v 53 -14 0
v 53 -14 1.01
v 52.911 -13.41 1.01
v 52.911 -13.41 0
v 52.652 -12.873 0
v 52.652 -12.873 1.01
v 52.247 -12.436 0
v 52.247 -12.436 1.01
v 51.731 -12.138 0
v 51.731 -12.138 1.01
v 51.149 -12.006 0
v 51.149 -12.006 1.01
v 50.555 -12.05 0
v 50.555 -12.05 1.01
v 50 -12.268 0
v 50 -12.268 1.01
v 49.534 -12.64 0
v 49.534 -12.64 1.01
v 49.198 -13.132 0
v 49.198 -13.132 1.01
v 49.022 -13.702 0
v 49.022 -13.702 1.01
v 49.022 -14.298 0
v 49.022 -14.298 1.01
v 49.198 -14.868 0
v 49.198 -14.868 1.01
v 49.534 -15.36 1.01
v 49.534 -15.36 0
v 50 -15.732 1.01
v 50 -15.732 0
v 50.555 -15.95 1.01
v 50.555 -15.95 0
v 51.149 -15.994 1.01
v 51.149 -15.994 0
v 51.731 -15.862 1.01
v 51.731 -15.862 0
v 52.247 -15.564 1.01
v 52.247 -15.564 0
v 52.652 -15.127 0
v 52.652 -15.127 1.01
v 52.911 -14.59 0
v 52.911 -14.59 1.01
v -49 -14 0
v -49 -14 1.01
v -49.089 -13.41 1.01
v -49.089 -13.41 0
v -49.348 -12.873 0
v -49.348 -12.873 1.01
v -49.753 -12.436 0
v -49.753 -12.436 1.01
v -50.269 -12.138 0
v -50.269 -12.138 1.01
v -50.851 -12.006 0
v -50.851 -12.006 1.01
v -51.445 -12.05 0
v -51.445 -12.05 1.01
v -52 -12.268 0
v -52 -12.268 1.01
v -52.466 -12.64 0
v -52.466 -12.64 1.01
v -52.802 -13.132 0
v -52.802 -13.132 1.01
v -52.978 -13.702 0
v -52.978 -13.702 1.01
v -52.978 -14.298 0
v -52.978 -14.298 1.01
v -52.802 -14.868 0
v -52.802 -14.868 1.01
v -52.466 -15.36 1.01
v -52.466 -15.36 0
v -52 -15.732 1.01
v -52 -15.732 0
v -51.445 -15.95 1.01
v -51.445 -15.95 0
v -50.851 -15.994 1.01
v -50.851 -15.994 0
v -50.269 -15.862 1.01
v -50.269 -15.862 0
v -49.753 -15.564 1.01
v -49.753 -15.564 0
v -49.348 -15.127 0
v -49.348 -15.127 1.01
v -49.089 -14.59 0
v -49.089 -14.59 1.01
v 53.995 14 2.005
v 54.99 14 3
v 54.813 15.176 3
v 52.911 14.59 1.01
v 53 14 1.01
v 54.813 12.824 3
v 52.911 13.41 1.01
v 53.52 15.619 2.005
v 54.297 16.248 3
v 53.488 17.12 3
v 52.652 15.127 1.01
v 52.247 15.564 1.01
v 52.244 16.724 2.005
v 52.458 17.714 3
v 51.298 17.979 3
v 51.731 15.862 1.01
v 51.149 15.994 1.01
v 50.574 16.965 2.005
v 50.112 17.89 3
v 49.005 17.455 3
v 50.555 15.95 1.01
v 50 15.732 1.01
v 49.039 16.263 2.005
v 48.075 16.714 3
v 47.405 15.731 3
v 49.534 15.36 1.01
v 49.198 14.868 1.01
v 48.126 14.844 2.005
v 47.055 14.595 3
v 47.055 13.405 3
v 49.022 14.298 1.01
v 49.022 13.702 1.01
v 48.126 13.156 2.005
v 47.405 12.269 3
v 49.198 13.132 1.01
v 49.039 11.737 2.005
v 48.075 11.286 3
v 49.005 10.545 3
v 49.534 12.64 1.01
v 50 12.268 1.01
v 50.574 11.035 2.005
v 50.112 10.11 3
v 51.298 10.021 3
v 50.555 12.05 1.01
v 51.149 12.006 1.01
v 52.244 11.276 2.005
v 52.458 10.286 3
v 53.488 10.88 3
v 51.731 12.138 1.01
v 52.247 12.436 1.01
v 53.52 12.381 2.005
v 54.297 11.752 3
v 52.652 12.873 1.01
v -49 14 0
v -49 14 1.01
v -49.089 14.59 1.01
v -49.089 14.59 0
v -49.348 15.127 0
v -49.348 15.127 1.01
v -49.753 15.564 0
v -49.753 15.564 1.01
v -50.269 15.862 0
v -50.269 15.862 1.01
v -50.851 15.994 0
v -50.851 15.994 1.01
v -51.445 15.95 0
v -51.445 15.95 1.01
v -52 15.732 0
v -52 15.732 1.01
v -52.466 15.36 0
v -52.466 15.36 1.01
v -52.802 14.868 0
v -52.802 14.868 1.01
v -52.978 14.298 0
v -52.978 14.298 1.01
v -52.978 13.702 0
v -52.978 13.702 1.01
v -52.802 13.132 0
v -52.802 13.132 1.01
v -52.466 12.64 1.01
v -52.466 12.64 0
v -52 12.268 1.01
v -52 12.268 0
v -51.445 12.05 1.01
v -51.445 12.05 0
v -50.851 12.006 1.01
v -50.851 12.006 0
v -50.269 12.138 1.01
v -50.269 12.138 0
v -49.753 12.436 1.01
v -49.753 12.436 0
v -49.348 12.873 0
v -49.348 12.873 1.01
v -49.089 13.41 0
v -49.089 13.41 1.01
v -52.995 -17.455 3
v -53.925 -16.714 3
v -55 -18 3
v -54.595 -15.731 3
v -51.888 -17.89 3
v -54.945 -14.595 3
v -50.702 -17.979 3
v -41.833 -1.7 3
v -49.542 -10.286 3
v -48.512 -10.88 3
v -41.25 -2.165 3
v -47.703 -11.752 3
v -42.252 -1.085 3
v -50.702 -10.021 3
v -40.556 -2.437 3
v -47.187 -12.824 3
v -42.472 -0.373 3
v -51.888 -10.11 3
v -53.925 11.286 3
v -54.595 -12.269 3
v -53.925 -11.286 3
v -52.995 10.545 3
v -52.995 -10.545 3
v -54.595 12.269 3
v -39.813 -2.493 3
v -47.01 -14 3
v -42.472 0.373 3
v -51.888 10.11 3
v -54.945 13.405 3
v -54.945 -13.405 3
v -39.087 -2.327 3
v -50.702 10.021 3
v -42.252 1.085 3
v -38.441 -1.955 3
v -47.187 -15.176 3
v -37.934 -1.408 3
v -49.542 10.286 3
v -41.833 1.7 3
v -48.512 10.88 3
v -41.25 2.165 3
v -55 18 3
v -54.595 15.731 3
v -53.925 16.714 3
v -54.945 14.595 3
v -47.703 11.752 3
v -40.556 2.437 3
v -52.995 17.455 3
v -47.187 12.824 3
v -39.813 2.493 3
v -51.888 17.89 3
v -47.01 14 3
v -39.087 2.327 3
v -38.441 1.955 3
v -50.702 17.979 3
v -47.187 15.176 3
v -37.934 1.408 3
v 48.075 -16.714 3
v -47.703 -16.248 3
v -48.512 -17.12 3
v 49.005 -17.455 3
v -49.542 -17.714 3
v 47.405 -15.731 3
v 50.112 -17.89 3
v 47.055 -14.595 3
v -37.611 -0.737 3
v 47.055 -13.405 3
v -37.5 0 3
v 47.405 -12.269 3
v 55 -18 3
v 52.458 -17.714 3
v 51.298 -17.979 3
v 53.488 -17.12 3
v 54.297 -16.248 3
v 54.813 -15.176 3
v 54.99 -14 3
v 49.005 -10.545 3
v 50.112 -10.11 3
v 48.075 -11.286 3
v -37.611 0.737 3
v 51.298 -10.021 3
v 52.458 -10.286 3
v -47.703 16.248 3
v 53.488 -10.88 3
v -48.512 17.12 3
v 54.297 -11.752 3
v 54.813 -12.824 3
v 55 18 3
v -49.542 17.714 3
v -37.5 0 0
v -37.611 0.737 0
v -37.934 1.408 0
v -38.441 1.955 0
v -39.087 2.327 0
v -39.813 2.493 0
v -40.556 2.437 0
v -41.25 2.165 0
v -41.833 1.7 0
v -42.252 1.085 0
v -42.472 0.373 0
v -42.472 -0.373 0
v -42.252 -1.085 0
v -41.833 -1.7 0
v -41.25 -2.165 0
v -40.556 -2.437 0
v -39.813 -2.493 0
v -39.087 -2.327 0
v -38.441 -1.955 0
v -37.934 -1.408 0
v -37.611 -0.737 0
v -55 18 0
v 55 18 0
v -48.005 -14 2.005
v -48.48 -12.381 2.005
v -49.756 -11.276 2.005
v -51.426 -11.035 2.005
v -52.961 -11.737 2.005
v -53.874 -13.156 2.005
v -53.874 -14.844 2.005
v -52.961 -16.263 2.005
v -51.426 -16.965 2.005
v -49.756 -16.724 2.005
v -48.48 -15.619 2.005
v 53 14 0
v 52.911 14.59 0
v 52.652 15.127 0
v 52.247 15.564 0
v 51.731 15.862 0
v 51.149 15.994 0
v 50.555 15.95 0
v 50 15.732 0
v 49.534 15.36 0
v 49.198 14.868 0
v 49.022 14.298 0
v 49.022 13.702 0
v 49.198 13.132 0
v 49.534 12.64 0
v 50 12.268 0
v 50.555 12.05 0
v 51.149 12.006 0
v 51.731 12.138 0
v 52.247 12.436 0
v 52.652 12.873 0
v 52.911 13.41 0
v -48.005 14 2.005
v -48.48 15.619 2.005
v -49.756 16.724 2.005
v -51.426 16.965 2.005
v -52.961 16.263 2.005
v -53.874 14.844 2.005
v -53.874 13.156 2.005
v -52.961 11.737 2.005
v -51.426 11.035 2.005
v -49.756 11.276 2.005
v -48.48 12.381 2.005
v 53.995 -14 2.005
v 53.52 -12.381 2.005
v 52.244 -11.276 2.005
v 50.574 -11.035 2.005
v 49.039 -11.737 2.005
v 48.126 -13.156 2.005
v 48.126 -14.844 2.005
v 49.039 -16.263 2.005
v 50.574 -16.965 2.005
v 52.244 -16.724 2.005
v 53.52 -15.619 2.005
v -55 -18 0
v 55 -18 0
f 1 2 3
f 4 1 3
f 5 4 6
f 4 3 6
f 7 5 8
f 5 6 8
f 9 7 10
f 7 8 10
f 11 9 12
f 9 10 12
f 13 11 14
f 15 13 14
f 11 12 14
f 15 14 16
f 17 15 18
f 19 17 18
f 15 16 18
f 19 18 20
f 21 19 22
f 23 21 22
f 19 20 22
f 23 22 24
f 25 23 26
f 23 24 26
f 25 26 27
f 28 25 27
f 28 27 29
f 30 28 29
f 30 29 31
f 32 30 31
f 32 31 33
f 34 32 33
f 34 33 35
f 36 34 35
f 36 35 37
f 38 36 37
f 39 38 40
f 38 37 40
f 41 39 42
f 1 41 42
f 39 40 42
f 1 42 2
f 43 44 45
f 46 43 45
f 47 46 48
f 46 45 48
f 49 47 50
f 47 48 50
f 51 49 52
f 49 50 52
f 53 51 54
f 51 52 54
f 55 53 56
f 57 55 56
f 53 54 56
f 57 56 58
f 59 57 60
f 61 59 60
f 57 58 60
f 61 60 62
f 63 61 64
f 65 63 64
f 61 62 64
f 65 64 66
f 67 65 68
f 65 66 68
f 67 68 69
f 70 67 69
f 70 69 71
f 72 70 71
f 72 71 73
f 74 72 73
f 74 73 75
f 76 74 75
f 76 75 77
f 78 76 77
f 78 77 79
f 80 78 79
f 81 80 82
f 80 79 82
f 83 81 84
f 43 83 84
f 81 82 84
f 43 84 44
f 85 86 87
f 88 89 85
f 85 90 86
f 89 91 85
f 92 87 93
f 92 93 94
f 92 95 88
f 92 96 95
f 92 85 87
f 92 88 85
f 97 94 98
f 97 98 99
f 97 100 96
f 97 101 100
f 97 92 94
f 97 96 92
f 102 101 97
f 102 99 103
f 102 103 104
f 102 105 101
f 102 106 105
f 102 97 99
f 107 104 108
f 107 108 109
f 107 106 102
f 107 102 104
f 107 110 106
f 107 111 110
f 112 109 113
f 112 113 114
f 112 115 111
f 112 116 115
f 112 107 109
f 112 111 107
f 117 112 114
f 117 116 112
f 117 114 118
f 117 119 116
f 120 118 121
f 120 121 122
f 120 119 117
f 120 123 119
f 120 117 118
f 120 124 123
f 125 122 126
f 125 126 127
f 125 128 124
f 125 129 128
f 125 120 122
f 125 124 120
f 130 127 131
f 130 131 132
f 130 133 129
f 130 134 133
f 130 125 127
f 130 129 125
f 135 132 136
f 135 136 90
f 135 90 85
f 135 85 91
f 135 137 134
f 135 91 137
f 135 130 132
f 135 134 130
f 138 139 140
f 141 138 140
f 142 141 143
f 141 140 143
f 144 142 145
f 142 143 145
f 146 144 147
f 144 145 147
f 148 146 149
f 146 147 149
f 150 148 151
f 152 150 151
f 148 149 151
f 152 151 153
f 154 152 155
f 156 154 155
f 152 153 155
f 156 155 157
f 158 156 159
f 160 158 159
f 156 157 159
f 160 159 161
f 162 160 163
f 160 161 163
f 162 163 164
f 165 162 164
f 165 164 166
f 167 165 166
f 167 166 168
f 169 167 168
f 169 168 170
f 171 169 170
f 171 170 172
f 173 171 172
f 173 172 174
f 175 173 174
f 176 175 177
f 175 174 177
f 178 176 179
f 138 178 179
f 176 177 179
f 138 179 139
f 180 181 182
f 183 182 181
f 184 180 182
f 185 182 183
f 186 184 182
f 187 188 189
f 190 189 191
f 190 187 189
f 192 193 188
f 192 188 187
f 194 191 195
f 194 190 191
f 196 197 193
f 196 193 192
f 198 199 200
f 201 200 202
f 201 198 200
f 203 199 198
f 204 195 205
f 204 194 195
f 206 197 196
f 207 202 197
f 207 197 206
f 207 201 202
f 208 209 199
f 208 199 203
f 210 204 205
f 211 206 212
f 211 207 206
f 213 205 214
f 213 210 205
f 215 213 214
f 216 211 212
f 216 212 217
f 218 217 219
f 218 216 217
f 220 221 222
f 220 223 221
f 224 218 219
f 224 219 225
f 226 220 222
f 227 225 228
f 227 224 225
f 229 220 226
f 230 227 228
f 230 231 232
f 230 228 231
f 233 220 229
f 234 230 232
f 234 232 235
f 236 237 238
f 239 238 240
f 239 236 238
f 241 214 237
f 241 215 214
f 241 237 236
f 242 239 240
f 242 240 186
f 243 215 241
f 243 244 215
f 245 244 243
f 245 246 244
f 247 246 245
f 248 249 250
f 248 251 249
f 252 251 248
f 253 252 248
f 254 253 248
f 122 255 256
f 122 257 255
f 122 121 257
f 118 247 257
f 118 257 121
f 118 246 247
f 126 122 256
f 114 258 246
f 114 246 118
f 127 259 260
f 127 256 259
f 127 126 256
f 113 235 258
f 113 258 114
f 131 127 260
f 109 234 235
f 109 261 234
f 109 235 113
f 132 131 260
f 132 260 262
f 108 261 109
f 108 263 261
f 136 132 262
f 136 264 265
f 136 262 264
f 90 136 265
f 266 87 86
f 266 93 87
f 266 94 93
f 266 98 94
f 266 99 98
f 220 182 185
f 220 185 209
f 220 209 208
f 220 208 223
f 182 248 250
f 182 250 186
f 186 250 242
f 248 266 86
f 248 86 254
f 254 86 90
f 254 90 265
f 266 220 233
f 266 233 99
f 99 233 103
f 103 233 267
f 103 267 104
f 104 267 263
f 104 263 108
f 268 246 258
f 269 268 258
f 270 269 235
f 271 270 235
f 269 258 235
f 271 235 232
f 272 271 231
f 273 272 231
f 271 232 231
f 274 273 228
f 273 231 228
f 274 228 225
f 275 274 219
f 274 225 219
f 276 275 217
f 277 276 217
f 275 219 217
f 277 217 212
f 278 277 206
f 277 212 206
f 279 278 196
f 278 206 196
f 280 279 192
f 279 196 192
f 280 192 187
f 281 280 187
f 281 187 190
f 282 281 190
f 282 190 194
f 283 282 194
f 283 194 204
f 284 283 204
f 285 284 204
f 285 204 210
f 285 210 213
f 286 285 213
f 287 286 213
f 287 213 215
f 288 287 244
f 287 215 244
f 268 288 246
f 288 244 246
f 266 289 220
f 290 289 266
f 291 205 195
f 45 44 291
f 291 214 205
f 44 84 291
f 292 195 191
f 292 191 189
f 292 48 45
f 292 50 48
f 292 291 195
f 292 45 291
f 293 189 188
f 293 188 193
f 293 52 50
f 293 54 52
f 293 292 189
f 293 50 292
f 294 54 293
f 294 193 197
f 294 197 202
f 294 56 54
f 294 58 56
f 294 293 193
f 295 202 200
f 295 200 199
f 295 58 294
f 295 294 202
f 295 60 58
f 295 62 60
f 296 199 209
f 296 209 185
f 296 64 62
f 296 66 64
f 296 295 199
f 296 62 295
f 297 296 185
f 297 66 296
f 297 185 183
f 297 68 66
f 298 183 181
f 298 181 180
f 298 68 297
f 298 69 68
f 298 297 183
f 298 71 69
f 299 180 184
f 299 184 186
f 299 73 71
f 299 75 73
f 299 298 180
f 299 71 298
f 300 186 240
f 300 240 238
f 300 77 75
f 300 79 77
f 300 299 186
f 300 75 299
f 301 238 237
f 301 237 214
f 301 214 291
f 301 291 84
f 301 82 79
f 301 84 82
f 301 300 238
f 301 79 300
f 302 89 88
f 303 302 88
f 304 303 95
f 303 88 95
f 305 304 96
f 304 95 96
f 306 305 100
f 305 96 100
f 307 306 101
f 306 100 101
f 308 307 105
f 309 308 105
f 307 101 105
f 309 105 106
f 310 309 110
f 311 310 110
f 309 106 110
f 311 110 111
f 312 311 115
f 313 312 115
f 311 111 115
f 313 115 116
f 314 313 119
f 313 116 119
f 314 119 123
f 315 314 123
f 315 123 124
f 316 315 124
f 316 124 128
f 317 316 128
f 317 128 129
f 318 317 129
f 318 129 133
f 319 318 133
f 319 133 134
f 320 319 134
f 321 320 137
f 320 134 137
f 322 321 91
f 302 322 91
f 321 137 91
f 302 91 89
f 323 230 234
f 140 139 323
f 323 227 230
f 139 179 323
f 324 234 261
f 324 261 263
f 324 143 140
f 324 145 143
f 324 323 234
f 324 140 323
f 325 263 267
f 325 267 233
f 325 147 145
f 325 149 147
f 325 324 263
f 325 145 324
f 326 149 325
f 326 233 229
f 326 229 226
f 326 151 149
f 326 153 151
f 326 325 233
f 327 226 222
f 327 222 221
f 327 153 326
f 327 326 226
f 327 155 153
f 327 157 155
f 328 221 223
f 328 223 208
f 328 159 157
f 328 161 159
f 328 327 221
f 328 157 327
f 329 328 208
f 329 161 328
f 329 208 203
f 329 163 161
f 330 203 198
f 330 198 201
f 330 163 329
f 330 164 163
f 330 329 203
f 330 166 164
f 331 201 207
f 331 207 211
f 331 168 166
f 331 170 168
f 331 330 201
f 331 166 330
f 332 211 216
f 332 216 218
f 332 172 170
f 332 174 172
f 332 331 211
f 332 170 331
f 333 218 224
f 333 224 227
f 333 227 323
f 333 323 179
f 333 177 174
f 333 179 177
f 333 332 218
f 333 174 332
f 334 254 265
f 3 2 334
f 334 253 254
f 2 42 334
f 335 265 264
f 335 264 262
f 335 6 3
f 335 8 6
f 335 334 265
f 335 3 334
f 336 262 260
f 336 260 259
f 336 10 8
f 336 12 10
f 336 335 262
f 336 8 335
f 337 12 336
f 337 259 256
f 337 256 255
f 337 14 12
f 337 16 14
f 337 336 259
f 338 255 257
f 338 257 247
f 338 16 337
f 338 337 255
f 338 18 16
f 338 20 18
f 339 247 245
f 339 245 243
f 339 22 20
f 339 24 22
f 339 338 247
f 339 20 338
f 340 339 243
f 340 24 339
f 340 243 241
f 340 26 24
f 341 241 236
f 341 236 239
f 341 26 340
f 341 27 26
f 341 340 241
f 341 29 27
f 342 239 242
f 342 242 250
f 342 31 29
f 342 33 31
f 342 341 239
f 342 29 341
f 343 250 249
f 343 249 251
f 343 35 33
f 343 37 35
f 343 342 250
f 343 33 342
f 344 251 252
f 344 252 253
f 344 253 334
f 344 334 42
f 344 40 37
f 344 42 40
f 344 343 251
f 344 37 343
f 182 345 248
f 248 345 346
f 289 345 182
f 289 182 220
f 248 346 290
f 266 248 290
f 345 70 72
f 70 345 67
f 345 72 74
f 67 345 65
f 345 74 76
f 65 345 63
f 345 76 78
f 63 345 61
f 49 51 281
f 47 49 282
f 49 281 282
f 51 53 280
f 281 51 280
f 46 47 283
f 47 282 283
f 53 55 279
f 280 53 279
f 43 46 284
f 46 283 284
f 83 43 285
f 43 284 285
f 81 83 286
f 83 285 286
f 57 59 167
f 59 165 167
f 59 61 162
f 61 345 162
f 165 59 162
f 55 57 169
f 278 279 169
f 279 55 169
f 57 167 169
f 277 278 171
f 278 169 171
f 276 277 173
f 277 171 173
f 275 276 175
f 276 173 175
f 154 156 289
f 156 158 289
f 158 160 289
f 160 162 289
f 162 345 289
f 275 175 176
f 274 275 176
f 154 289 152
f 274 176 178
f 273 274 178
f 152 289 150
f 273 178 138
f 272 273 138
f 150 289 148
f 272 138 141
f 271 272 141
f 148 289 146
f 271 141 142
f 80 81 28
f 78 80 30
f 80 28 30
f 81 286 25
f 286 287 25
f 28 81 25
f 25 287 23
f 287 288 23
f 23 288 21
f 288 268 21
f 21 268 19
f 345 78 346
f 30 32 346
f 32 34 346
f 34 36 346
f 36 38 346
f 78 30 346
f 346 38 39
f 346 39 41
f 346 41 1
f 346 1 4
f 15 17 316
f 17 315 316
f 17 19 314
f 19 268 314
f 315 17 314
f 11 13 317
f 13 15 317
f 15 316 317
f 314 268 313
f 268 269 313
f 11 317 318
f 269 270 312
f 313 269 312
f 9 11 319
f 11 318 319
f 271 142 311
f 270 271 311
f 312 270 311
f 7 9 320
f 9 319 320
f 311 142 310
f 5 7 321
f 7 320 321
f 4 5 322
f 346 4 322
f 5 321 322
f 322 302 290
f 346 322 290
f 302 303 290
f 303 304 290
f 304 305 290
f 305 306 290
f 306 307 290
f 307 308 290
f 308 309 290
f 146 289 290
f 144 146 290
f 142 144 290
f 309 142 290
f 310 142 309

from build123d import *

# Parameters (mm, degrees)
SKETCH_W        = 110
SKETCH_H        = 36
PAD_DEPTH       = 3
SKETCH002_R     = 2
POCKET_DEPTH    = 3
CHAMFER_SIZE    = 1.99
SKETCH003_R     = 2.5
POCKET001_DEPTH = 3


with BuildPart() as part:
    # Sketch → Pad (new body)
    with BuildSketch(Plane.XY):
        Rectangle(SKETCH_W, SKETCH_H)
    extrude(amount=PAD_DEPTH)

    # Sketch002 (on Face6 of Pad) → Pocket (cut)
    with BuildSketch(Plane.XY.offset(3)):
        with Locations((-51, 14)):
            Circle(SKETCH002_R)
        with Locations((-51, -14)):
            Circle(SKETCH002_R)
        with Locations((51, -14)):
            Circle(SKETCH002_R)
        with Locations((51, 14)):
            Circle(SKETCH002_R)
    extrude(amount=-POCKET_DEPTH, mode=Mode.SUBTRACT)

    # Chamfer
    chamfer_edges = [part.edges().sort_by_distance(p)[0] for p in [
        (-53, 14, 3),
        (-53, -14, 3),
        (49, -14, 3),
        (49, 14, 3),
    ]]
    chamfer(chamfer_edges, length=CHAMFER_SIZE)

    # Sketch003 (on Face1 of Chamfer) → Pocket001 (cut)
    with BuildSketch(Plane.XY.offset(3)):
        with Locations((-40, 0)):
            Circle(SKETCH003_R)
    extrude(amount=-POCKET001_DEPTH, mode=Mode.SUBTRACT)


solid = part.part
